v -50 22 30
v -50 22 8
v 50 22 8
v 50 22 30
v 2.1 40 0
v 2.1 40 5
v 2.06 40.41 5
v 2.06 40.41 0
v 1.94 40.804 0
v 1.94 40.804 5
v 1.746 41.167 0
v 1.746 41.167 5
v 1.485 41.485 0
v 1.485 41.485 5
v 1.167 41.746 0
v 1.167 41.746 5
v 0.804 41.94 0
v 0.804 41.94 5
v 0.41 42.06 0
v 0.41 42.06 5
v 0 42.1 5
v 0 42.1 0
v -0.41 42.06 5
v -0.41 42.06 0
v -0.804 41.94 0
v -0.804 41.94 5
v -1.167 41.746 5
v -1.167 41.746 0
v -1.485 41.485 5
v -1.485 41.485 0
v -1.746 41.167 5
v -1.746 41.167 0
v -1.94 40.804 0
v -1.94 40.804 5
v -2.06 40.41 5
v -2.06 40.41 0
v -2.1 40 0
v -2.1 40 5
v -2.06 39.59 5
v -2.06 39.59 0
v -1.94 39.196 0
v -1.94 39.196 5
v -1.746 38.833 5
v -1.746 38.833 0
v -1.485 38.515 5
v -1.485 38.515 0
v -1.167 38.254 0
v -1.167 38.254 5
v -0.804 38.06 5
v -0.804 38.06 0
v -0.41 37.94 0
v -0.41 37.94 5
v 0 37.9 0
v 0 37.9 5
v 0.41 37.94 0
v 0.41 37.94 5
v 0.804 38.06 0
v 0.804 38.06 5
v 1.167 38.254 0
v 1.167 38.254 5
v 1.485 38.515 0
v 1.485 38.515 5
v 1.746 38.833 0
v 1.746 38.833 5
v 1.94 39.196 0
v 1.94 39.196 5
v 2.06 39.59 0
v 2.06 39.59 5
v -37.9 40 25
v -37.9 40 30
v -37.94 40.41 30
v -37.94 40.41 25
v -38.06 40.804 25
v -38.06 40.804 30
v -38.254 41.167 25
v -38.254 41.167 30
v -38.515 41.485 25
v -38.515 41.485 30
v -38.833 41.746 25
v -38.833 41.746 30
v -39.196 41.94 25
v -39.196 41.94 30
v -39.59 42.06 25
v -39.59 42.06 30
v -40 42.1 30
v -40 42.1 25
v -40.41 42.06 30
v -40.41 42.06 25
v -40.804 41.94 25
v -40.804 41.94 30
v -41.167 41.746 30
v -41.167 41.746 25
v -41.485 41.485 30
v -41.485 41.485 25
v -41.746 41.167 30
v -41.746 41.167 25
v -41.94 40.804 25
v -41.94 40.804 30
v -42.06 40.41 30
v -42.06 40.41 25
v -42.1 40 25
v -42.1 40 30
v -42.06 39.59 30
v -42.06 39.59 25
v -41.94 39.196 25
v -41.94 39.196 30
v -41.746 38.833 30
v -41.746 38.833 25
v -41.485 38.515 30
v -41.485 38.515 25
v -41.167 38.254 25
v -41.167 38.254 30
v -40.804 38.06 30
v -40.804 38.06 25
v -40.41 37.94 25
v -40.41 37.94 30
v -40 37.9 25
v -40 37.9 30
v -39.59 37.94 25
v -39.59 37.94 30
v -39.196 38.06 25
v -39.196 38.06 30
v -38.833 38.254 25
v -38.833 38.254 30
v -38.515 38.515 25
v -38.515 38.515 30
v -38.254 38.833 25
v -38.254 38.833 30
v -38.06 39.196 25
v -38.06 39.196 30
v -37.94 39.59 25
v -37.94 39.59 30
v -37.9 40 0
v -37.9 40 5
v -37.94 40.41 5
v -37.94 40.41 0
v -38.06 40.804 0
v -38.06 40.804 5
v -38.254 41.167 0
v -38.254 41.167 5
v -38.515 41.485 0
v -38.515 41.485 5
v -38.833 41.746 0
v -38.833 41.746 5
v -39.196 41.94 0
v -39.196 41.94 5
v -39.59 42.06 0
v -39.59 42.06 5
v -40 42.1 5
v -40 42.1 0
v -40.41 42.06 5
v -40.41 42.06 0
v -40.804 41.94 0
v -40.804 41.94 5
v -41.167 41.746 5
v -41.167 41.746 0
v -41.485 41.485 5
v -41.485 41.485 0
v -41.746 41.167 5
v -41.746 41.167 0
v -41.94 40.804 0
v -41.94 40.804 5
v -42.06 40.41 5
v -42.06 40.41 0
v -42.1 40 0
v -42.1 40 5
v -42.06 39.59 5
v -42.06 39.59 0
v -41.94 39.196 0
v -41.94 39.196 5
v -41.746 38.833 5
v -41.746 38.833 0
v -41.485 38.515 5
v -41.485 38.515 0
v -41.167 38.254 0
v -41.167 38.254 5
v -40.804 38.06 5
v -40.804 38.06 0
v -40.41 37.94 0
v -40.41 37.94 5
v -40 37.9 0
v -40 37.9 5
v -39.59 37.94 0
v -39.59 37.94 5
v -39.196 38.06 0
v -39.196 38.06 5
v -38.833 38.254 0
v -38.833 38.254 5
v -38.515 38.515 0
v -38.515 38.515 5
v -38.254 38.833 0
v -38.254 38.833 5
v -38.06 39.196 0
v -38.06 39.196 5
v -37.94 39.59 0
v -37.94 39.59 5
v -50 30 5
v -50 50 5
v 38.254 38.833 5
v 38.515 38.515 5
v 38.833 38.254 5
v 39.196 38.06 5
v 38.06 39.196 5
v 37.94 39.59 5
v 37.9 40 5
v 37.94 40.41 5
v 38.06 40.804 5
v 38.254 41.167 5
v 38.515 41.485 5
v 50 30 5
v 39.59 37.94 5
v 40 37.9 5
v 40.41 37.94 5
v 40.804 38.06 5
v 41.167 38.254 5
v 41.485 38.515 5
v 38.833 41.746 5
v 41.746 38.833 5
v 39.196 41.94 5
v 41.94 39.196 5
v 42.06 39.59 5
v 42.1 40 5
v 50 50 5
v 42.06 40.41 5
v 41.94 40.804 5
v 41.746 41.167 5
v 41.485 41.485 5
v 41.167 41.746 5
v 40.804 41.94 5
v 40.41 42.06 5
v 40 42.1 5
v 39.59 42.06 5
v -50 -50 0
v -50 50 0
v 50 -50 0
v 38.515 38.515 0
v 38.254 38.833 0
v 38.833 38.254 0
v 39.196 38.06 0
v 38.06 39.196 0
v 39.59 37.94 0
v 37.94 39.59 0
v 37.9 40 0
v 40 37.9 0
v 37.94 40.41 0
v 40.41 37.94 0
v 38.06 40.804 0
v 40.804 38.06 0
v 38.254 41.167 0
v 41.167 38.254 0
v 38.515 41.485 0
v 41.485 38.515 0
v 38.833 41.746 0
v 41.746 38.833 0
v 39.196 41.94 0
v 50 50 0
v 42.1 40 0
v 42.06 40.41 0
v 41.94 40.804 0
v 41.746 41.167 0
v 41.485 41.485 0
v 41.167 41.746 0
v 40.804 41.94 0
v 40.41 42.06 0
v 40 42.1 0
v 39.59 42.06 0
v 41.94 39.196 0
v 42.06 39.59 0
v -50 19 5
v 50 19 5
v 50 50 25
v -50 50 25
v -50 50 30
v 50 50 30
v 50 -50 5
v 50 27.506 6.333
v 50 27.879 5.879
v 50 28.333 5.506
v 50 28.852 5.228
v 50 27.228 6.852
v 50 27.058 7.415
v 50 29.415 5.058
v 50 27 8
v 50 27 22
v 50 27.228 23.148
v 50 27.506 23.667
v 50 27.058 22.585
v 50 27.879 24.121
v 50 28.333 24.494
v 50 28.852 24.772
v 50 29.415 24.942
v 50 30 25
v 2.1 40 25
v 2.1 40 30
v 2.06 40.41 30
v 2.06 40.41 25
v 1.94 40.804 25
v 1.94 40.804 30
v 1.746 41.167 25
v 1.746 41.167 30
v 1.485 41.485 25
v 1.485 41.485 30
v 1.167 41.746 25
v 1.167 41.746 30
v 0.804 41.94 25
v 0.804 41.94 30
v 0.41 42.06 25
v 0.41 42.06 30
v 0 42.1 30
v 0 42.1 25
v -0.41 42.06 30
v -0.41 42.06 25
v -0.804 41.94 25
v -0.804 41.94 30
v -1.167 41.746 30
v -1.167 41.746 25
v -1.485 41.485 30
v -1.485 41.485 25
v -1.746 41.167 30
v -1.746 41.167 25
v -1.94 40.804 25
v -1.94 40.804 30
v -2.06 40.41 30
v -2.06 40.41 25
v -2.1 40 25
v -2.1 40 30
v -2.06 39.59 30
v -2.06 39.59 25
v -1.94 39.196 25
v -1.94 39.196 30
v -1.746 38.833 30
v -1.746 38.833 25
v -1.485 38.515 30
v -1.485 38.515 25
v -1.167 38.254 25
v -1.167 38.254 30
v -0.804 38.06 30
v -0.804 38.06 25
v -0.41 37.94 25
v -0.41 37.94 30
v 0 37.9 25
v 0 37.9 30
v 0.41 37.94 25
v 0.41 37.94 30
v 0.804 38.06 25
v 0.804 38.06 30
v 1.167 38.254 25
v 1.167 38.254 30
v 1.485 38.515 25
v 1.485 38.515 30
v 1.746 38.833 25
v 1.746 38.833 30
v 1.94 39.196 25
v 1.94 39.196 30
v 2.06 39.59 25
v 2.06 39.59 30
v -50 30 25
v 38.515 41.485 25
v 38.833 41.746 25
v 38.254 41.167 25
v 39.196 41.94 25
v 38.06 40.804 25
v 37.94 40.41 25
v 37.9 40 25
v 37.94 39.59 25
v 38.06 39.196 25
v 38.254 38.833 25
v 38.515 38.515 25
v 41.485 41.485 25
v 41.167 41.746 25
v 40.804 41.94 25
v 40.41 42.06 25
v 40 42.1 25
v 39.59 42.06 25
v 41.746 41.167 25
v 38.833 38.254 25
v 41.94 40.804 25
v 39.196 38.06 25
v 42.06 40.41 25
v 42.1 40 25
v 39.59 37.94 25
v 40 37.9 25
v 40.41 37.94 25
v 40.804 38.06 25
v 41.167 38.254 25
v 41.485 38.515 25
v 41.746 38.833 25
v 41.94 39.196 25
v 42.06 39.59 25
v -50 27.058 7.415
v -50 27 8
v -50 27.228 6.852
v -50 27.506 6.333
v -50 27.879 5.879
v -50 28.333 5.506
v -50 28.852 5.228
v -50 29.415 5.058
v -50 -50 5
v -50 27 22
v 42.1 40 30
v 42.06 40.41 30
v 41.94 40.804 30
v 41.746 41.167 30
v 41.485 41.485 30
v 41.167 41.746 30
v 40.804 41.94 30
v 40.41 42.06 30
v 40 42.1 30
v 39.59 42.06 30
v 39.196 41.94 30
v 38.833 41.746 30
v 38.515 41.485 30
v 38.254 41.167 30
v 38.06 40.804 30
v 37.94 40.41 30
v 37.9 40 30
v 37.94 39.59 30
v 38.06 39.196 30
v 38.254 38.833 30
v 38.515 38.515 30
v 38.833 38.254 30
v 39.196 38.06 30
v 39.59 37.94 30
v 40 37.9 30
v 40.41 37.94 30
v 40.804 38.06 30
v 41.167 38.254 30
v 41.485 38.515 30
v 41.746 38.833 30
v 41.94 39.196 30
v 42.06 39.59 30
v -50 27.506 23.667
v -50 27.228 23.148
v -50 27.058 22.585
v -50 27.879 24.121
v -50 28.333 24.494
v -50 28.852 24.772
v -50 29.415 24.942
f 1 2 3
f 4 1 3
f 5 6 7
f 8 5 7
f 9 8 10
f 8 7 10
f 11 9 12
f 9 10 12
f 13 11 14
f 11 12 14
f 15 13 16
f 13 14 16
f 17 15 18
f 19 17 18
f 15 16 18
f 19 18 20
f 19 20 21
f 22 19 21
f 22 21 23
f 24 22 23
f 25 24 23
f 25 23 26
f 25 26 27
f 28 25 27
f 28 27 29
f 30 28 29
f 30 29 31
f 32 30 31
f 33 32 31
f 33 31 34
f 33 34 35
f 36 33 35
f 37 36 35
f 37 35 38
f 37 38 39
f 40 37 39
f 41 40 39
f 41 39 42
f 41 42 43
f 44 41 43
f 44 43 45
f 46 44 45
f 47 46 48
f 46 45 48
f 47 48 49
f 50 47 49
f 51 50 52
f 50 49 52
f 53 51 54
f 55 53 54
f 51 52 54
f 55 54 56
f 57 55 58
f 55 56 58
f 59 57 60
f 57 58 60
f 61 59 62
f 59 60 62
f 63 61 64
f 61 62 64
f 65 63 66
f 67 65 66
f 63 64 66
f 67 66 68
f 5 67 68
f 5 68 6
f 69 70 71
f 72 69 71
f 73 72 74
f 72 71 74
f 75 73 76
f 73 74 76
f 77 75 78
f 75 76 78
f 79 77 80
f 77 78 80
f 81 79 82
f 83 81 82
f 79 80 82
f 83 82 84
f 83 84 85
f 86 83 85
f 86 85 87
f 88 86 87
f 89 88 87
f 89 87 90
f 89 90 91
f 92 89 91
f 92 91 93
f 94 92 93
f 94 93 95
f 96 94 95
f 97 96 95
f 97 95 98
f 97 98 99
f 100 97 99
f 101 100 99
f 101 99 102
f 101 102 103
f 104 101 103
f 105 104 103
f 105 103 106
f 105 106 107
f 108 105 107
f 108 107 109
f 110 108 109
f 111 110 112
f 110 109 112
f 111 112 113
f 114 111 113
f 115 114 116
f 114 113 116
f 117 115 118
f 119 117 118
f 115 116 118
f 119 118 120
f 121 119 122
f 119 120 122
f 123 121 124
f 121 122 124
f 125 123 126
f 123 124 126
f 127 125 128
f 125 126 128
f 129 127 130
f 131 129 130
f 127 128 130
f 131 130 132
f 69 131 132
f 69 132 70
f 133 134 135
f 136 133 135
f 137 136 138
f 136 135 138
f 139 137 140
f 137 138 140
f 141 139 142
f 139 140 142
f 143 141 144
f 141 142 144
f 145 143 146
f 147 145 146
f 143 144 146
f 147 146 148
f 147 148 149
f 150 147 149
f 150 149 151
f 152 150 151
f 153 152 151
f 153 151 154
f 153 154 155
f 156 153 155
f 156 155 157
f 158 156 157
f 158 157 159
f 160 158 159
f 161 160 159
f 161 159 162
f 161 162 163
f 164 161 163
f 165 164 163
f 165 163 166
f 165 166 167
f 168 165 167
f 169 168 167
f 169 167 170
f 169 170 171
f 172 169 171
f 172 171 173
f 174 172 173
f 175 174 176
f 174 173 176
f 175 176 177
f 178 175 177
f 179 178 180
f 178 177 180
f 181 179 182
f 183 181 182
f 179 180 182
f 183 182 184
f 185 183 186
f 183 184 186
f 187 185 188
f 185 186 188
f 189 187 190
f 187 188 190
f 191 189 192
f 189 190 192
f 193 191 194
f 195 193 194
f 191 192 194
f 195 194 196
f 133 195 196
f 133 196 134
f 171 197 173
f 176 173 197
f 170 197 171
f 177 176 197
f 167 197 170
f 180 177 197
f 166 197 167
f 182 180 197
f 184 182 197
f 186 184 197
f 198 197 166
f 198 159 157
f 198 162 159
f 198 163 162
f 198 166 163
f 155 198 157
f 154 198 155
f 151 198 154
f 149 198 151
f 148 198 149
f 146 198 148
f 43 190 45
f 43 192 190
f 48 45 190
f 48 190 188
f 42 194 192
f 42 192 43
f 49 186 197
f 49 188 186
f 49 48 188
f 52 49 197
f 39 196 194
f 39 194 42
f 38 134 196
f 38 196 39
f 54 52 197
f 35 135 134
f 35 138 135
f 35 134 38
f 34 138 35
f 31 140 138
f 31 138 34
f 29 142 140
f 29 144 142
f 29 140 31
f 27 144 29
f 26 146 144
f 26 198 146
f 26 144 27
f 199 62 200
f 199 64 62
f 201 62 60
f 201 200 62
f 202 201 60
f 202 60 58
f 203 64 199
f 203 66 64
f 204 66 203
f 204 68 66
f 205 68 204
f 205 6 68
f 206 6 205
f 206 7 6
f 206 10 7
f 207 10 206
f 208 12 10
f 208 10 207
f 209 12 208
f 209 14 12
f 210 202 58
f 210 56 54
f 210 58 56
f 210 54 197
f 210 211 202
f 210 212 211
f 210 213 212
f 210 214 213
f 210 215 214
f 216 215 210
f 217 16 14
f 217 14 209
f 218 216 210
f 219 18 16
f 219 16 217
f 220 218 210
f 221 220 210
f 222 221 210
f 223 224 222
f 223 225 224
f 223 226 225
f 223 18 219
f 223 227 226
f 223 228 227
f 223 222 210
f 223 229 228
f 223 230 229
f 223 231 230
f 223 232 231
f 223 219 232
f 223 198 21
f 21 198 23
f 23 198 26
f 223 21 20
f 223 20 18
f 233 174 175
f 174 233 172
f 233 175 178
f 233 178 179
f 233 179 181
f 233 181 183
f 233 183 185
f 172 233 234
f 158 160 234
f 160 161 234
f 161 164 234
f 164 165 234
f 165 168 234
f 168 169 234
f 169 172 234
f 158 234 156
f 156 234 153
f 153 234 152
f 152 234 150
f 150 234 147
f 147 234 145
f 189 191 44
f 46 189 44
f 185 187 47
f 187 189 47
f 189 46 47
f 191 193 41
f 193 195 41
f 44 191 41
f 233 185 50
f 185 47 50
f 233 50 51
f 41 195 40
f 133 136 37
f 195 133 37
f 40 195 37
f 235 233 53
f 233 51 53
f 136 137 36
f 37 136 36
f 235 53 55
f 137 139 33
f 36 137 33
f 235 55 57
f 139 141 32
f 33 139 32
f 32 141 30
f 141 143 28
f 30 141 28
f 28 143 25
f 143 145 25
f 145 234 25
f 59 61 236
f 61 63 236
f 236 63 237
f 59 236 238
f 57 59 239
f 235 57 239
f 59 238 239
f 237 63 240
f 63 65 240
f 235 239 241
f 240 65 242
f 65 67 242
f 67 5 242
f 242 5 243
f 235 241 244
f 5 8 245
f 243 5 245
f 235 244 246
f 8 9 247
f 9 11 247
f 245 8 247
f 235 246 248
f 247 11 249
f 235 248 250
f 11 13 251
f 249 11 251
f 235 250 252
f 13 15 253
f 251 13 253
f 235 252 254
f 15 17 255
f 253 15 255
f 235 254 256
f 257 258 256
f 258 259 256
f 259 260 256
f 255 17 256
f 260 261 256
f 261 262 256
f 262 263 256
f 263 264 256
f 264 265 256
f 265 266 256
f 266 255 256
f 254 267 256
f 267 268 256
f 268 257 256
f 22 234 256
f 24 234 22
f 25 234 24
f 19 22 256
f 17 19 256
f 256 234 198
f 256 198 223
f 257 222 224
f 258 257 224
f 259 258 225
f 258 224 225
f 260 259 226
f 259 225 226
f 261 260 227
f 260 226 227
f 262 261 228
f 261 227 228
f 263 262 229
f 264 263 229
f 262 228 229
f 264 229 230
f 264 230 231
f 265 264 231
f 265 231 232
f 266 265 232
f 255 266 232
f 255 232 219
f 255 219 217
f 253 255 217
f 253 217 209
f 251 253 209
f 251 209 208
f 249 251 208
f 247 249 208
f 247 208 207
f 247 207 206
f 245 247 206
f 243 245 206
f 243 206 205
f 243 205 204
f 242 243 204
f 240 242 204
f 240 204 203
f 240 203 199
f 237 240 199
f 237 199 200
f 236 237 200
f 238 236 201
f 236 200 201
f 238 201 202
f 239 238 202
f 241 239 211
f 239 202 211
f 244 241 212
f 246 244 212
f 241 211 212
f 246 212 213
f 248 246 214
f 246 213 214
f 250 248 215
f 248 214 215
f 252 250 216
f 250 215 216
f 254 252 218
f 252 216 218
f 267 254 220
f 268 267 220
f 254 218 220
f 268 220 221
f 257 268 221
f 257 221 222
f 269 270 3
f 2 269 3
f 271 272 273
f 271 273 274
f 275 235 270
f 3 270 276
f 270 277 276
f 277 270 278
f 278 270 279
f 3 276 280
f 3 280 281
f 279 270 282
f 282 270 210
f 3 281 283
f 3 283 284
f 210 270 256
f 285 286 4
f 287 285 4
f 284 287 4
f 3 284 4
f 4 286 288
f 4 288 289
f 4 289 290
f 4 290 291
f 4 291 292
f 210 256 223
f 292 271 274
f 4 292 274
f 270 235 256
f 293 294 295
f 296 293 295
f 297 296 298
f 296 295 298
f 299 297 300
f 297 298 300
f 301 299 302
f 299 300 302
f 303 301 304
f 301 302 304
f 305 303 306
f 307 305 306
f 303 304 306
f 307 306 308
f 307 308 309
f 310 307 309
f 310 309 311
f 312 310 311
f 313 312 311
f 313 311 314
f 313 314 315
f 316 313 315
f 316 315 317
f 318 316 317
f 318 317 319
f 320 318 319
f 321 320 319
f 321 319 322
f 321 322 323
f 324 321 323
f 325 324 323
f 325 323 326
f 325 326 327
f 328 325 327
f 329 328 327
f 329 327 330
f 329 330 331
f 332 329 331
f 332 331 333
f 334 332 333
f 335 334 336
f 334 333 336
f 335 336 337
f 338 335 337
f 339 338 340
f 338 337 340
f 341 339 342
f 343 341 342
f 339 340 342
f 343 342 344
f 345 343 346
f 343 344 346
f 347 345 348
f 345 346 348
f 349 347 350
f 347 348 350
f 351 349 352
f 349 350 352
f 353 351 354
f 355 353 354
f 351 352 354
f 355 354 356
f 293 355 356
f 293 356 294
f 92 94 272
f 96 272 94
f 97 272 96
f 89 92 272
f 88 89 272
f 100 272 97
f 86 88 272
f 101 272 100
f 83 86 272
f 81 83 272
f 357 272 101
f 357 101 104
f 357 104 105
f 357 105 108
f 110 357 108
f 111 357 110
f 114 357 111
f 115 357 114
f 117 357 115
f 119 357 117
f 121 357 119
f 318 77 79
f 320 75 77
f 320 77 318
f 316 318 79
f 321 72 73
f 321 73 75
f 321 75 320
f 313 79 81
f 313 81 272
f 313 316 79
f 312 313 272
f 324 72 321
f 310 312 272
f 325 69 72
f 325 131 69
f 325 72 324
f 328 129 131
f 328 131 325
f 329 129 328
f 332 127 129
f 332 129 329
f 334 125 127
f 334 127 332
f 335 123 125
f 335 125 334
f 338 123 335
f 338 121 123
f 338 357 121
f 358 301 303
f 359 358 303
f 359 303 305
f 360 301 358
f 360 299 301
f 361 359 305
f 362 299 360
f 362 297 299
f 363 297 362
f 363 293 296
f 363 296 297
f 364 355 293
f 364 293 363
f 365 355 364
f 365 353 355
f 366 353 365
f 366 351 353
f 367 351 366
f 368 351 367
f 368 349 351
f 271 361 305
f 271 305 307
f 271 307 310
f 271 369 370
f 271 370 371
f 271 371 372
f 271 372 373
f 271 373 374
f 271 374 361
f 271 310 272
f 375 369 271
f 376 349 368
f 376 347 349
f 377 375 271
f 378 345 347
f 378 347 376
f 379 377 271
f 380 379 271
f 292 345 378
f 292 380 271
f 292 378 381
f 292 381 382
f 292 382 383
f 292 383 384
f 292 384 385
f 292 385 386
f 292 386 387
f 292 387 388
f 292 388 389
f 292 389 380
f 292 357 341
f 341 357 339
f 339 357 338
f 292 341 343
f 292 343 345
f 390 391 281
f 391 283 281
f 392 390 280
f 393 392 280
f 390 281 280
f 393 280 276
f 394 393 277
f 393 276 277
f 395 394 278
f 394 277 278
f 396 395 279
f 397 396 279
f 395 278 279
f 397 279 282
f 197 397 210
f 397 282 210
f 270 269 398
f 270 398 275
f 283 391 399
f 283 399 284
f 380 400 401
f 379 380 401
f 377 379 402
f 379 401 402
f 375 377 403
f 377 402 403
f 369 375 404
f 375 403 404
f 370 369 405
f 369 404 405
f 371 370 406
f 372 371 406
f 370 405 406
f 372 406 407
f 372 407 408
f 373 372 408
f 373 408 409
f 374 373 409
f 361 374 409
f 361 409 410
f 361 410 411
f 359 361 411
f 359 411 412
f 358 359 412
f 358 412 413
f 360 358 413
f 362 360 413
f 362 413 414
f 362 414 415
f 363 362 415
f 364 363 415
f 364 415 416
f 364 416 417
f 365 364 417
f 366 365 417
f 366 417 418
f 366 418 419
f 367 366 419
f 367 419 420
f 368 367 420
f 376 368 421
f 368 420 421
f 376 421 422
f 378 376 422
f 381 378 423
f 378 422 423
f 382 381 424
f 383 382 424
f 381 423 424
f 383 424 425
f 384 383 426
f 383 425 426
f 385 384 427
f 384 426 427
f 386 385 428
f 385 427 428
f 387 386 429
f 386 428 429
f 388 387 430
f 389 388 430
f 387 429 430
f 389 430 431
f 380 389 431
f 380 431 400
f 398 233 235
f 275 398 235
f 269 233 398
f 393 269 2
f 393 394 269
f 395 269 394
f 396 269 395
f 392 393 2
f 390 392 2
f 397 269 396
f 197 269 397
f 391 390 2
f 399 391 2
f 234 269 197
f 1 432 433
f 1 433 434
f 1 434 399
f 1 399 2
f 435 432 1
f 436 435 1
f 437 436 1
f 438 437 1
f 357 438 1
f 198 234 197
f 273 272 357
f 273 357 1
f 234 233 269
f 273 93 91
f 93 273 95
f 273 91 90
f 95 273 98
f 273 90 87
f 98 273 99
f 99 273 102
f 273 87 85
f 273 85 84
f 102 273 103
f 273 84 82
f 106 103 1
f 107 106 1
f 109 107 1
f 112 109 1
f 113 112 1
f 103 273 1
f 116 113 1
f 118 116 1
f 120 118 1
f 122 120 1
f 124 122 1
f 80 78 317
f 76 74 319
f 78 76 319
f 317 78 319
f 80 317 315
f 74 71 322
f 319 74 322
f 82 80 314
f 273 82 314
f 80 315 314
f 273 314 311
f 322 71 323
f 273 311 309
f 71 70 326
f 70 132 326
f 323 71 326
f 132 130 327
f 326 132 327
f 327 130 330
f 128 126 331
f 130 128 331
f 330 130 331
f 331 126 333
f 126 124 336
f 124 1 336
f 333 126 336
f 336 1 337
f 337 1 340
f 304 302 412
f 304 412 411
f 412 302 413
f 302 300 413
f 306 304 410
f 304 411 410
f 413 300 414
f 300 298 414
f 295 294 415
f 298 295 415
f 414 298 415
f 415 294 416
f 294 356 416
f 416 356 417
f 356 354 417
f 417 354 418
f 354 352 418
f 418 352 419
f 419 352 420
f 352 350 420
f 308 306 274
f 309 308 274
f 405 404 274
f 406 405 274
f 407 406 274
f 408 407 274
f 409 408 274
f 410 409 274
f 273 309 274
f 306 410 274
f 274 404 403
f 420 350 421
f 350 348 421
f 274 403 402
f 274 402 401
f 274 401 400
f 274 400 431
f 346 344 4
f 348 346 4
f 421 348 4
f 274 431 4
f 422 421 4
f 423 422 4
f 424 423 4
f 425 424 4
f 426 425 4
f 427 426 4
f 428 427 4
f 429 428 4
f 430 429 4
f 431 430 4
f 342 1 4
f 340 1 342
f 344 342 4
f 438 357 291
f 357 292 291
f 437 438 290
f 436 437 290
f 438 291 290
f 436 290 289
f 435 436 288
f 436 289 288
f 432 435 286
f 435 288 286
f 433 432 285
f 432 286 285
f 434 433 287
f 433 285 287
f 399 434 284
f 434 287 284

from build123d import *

# Parameters (mm, degrees)
SKETCH_1_W          = 100
SKETCH_1_H          = 72
EXTRUDE_1_DEPTH     = 5
SKETCH_1_H_2        = 23
EXTRUDE_1_2_DEPTH   = 5
SKETCH_1_3_W        = 100
SKETCH_1_3_H        = 5
EXTRUDE_2_DEPTH     = 30
SKETCH_2_W          = 100
SKETCH_2_H          = 5
EXTRUDE_3_DEPTH     = 23
SKETCH_3_R          = 2.1
CUT_EXTRUDE_1_DEPTH = 77.811457479
FILLET_1_R          = 3
EXTRUDE_4_DEPTH     = 100


with BuildPart() as part:
    # 草图1 → 凸台-拉伸1 (new body)
    with BuildSketch(Plane.XY):
        with Locations((0, -14)):
            Rectangle(SKETCH_1_W, SKETCH_1_H)
    extrude(amount=EXTRUDE_1_DEPTH)



with BuildPart() as body_2:
    # 草图1 → Extrude 1 2 (new body)
    with BuildSketch(Plane.XY):
        with Locations((0, 38.5)):
            Rectangle(SKETCH_1_W, SKETCH_1_H_2)
    extrude(amount=EXTRUDE_1_2_DEPTH)


with BuildPart() as part_1:
    add(part.part)

    add(body_2.part)  # 凸台-拉伸2 merges body 2
    # 草图1<3> → 凸台-拉伸2 (add)
    with BuildSketch(Plane.XY):
        with Locations((0, 24.5)):
            Rectangle(SKETCH_1_3_W, SKETCH_1_3_H)
    extrude(amount=EXTRUDE_2_DEPTH)

    # 草图2 → 凸台-拉伸3 (add)
    with BuildSketch(Plane(origin=(0, 27, 0), x_dir=(1, 0, 0), z_dir=(0, 1, 0))):
        with Locations((0, -27.5)):
            Rectangle(SKETCH_2_W, SKETCH_2_H)
    extrude(amount=EXTRUDE_3_DEPTH)

    # 草图3 → 切除-拉伸1 (cut, through all)
    with BuildSketch(Plane.XY.offset(30)):
        with Locations((-40, 40)):
            Circle(SKETCH_3_R)
        with Locations((0, 40)):
            Circle(SKETCH_3_R)
        with Locations((40, 40)):
            Circle(SKETCH_3_R)
    extrude(amount=-CUT_EXTRUDE_1_DEPTH, mode=Mode.SUBTRACT)

    # 圆角1
    fillet_1_edges = [part_1.edges().sort_by_distance(p)[0] for p in [
        (0, 27, 5),
        (0, 27, 25),
    ]]
    fillet(fillet_1_edges, radius=FILLET_1_R)

    # 草图8 → 凸台-拉伸4 (add, through all)
    with BuildSketch(Plane.ZY.offset(50)):
        Polygon((5, 19), (8, 22), (5, 22), align=None)
    extrude(amount=-EXTRUDE_4_DEPTH)


solid = part_1.part
